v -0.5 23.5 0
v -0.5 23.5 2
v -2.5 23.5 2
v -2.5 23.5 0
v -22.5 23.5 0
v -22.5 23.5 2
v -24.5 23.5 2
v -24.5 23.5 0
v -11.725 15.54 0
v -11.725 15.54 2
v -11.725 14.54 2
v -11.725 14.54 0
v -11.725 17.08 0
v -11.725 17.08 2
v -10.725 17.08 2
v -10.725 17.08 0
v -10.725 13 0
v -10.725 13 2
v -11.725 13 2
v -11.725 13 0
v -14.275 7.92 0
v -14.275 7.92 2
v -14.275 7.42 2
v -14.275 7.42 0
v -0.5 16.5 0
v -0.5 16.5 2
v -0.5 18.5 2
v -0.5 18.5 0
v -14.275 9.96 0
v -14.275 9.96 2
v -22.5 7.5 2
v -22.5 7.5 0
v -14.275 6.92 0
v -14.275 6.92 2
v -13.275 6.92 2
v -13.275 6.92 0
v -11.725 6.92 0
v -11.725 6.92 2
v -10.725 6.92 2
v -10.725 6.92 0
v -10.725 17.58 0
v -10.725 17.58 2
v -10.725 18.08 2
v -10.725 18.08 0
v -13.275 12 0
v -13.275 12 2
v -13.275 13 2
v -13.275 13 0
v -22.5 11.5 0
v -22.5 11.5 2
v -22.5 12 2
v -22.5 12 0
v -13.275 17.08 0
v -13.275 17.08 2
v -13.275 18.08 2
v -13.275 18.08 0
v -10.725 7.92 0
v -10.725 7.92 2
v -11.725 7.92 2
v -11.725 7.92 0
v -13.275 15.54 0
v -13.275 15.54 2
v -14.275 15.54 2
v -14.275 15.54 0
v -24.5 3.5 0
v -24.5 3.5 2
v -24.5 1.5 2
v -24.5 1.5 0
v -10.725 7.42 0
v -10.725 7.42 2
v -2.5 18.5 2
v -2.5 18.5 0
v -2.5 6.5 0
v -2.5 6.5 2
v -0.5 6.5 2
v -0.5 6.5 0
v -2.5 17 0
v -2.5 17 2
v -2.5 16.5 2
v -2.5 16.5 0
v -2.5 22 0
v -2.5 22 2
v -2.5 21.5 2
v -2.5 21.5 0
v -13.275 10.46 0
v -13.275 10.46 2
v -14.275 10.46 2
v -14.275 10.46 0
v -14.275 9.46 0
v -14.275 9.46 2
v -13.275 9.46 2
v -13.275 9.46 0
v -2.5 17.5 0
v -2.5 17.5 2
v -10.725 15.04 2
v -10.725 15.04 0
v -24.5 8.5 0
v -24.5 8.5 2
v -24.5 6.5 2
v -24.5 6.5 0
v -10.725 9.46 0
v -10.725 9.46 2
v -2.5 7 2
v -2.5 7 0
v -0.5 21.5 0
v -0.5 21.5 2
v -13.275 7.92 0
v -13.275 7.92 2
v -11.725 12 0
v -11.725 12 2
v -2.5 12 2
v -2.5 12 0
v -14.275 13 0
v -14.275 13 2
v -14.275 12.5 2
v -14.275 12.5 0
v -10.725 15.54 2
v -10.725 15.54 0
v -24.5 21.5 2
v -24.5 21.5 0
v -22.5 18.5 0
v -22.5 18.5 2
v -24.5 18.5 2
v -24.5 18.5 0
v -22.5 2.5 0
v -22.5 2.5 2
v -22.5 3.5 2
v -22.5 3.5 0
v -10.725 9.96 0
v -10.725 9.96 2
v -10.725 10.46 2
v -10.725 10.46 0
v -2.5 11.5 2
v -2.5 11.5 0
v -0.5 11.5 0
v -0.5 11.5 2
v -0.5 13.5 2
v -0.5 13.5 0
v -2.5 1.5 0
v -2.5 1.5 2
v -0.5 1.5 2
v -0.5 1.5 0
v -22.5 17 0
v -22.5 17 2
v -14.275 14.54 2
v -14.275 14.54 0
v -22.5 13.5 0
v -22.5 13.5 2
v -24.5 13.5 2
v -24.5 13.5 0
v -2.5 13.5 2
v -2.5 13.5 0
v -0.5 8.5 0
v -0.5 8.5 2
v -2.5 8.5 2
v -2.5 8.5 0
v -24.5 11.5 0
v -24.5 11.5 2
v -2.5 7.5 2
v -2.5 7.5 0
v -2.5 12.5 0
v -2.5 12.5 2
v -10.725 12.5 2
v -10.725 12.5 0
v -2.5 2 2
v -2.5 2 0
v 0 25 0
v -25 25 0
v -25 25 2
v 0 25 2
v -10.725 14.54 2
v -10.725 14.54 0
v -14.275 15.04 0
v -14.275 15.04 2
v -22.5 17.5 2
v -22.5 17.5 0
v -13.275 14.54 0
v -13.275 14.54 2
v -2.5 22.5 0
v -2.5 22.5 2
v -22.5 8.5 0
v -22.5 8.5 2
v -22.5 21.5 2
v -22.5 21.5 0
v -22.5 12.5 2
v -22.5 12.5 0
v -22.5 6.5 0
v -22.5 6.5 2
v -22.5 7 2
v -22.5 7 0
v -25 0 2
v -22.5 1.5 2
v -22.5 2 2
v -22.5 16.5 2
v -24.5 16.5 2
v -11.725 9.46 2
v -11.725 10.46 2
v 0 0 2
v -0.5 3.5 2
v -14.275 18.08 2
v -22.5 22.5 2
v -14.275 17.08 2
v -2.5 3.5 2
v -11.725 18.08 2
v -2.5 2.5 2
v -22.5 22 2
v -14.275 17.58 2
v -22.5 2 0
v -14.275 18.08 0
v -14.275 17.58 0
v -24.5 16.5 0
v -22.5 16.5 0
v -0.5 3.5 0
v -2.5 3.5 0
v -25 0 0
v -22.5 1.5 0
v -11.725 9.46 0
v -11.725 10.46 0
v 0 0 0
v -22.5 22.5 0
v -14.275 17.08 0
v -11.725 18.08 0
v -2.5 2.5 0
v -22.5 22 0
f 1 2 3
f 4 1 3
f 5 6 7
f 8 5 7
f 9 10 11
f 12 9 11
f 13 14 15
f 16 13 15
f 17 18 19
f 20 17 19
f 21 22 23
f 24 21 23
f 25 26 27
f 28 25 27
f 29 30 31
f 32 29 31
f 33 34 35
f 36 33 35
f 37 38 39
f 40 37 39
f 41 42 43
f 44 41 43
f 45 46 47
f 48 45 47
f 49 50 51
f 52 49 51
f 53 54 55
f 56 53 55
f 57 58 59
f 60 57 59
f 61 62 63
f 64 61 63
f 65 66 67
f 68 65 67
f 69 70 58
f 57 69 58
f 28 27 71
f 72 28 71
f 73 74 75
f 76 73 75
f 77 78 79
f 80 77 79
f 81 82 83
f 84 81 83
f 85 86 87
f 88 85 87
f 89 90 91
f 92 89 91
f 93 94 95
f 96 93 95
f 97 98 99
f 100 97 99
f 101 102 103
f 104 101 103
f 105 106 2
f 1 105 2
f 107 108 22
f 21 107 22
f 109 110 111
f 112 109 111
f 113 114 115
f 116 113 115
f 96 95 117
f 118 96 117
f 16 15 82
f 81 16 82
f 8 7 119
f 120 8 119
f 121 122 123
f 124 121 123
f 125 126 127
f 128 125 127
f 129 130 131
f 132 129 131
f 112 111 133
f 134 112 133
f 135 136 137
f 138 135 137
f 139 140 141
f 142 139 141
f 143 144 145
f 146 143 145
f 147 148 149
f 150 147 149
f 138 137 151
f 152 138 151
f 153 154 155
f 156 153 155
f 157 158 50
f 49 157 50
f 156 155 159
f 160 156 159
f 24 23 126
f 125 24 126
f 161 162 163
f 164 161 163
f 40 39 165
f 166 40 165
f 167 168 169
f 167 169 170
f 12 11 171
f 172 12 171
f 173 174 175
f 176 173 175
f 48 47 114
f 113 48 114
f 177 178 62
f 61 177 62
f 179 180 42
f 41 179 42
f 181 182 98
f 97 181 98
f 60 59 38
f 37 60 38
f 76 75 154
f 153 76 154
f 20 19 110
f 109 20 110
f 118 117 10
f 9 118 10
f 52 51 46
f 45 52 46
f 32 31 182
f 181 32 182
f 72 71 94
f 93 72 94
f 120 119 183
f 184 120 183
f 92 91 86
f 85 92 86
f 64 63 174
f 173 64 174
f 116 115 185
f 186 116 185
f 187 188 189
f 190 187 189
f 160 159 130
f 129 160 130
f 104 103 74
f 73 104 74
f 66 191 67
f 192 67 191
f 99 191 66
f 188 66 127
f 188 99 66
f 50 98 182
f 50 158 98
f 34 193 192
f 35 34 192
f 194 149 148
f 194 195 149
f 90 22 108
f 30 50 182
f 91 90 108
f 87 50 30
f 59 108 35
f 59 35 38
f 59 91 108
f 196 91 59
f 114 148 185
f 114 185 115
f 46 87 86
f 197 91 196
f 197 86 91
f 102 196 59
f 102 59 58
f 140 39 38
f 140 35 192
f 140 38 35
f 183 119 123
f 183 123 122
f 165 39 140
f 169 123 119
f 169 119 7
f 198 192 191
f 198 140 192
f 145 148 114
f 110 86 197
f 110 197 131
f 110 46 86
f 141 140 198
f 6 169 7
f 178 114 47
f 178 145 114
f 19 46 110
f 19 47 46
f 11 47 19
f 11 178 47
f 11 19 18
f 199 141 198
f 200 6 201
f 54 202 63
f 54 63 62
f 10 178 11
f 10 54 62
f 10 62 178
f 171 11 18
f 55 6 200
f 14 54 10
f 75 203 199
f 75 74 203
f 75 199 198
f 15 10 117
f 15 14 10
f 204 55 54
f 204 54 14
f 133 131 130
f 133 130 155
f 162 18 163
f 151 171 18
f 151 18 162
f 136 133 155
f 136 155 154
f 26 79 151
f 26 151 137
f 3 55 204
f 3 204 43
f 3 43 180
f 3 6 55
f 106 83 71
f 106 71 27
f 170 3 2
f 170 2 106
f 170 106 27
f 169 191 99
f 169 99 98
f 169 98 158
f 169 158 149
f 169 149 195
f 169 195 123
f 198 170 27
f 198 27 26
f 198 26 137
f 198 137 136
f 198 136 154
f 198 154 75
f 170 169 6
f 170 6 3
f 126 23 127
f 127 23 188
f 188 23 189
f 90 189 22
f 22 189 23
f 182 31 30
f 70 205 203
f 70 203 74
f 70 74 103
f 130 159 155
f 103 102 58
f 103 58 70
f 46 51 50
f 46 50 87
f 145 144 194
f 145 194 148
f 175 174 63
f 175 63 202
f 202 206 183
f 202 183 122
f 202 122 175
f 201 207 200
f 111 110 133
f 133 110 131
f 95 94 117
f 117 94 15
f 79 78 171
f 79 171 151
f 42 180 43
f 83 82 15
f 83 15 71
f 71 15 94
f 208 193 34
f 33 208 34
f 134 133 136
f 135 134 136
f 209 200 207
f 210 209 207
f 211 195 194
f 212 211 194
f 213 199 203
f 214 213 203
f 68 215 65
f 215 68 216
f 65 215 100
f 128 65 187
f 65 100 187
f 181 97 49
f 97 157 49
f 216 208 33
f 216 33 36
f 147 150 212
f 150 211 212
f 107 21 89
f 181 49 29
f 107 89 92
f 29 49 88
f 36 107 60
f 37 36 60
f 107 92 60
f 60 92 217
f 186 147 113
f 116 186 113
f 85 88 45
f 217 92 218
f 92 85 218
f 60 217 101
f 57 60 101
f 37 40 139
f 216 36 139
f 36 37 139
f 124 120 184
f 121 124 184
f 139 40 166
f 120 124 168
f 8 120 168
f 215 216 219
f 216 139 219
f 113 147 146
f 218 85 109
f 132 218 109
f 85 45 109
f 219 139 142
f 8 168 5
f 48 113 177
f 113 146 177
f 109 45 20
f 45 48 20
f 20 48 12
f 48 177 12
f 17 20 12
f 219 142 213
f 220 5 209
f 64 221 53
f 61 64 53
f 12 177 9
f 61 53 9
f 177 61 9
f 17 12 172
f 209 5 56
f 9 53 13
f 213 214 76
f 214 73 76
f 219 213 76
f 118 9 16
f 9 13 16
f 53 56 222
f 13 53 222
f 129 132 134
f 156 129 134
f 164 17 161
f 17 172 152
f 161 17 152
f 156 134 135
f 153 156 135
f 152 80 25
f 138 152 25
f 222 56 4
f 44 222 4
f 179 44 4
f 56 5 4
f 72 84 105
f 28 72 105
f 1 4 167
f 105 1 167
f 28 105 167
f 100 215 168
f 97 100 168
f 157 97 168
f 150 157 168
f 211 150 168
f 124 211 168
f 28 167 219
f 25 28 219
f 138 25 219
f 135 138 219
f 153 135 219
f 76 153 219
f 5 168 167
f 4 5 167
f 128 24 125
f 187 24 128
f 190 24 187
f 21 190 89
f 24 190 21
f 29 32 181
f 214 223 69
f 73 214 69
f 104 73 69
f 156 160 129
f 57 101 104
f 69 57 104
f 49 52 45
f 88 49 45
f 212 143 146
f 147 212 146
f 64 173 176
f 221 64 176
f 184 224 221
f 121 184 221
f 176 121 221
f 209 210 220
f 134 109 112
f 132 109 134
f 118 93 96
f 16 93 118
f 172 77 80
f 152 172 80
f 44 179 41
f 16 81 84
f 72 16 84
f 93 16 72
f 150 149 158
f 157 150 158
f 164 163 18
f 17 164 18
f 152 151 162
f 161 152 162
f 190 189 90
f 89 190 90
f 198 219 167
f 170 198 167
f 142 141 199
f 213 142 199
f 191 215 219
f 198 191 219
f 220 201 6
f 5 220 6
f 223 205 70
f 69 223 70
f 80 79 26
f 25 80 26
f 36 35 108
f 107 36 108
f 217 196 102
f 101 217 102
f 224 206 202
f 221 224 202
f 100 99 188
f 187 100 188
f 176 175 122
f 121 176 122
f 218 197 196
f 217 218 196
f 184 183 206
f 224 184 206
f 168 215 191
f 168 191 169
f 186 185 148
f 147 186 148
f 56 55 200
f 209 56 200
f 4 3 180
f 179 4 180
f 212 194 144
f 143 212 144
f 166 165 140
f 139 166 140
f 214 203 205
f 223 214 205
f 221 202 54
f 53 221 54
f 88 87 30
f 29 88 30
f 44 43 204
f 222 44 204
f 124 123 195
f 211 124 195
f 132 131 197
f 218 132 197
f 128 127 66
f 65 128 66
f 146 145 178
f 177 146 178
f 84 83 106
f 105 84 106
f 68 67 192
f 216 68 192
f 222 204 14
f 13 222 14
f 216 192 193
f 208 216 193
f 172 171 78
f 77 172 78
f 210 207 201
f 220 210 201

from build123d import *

# Parameters (mm, degrees)
F0_W     = 25
F0_H     = 25
F1_DEPTH = 2
F3_DEPTH = 2


# Not quite as in the source:
# - a feature names something its author has since deleted; it is built from what else it names


with BuildPart() as f1:
    # F0 (on Top) → F1 (new body)
    with BuildSketch(Plane.XY):
        with Locations((-12.5, 12.5)):
            Rectangle(F0_W, F0_H)
    extrude(amount=F1_DEPTH)

    # F2 (on face) → F3 (cut)
    with BuildSketch(Plane.XY.offset(2)):
        Polygon((-13.275, 15.54), (-14.275, 15.54), (-14.275, 15.04), (-22.5, 17.5), (-22.5, 18.5), (-24.5, 18.5), (-24.5, 16.5), (-22.5, 16.5), (-22.5, 17), (-14.275, 14.54), (-13.275, 14.54), align=None)
        Polygon((-13.275, 18.08), (-14.275, 18.08), (-14.275, 17.58), (-22.5, 22.5), (-22.5, 23.5), (-24.5, 23.5), (-24.5, 21.5), (-22.5, 21.5), (-22.5, 22), (-14.275, 17.08), (-13.275, 17.08), align=None)
        Polygon((-13.275, 13), (-14.275, 13), (-14.275, 12.5), (-22.5, 12.5), (-22.5, 13.5), (-24.5, 13.5), (-24.5, 11.5), (-22.5, 11.5), (-22.5, 12), (-14.275, 12), (-13.275, 12), align=None)
        Polygon((-13.275, 10.46), (-14.275, 10.46), (-14.275, 9.96), (-22.5, 7.5), (-22.5, 8.5), (-24.5, 8.5), (-24.5, 6.5), (-22.5, 6.5), (-22.5, 7), (-14.275, 9.46), (-13.275, 9.46), align=None)
        Polygon((-13.275, 7.92), (-14.275, 7.92), (-14.275, 7.42), (-22.5, 2.5), (-22.5, 3.5), (-24.5, 3.5), (-24.5, 1.5), (-22.5, 1.5), (-22.5, 2), (-14.275, 6.92), (-13.275, 6.92), align=None)
        Polygon((-10.725, 6.92), (-2.5, 2), (-2.5, 1.5), (-0.5, 1.5), (-0.5, 3.5), (-2.5, 3.5), (-2.5, 2.5), (-10.725, 7.42), (-10.725, 7.92), (-11.725, 7.92), (-11.725, 6.92), align=None)
        Polygon((-11.725, 12), (-10.725, 12), (-2.5, 12), (-2.5, 11.5), (-0.5, 11.5), (-0.5, 13.5), (-2.5, 13.5), (-2.5, 12.5), (-10.725, 12.5), (-10.725, 13), (-11.725, 13), align=None)
        Polygon((-11.725, 14.54), (-10.725, 14.54), (-2.5, 17), (-2.5, 16.5), (-0.5, 16.5), (-0.5, 18.5), (-2.5, 18.5), (-2.5, 17.5), (-10.725, 15.04), (-10.725, 15.54), (-11.725, 15.54), align=None)
        Polygon((-10.725, 17.58), (-10.725, 18.08), (-11.725, 18.08), (-11.725, 17.08), (-10.725, 17.08), (-2.5, 22), (-2.5, 21.5), (-0.5, 21.5), (-0.5, 23.5), (-2.5, 23.5), (-2.5, 22.5), align=None)
        Polygon((-10.725, 9.96), (-10.725, 10.46), (-11.725, 10.46), (-11.725, 9.46), (-10.725, 9.46), (-2.5, 7), (-2.5, 6.5), (-0.5, 6.5), (-0.5, 8.5), (-2.5, 8.5), (-2.5, 7.5), align=None)
    extrude(amount=-F3_DEPTH, mode=Mode.SUBTRACT)


solid = f1.part
